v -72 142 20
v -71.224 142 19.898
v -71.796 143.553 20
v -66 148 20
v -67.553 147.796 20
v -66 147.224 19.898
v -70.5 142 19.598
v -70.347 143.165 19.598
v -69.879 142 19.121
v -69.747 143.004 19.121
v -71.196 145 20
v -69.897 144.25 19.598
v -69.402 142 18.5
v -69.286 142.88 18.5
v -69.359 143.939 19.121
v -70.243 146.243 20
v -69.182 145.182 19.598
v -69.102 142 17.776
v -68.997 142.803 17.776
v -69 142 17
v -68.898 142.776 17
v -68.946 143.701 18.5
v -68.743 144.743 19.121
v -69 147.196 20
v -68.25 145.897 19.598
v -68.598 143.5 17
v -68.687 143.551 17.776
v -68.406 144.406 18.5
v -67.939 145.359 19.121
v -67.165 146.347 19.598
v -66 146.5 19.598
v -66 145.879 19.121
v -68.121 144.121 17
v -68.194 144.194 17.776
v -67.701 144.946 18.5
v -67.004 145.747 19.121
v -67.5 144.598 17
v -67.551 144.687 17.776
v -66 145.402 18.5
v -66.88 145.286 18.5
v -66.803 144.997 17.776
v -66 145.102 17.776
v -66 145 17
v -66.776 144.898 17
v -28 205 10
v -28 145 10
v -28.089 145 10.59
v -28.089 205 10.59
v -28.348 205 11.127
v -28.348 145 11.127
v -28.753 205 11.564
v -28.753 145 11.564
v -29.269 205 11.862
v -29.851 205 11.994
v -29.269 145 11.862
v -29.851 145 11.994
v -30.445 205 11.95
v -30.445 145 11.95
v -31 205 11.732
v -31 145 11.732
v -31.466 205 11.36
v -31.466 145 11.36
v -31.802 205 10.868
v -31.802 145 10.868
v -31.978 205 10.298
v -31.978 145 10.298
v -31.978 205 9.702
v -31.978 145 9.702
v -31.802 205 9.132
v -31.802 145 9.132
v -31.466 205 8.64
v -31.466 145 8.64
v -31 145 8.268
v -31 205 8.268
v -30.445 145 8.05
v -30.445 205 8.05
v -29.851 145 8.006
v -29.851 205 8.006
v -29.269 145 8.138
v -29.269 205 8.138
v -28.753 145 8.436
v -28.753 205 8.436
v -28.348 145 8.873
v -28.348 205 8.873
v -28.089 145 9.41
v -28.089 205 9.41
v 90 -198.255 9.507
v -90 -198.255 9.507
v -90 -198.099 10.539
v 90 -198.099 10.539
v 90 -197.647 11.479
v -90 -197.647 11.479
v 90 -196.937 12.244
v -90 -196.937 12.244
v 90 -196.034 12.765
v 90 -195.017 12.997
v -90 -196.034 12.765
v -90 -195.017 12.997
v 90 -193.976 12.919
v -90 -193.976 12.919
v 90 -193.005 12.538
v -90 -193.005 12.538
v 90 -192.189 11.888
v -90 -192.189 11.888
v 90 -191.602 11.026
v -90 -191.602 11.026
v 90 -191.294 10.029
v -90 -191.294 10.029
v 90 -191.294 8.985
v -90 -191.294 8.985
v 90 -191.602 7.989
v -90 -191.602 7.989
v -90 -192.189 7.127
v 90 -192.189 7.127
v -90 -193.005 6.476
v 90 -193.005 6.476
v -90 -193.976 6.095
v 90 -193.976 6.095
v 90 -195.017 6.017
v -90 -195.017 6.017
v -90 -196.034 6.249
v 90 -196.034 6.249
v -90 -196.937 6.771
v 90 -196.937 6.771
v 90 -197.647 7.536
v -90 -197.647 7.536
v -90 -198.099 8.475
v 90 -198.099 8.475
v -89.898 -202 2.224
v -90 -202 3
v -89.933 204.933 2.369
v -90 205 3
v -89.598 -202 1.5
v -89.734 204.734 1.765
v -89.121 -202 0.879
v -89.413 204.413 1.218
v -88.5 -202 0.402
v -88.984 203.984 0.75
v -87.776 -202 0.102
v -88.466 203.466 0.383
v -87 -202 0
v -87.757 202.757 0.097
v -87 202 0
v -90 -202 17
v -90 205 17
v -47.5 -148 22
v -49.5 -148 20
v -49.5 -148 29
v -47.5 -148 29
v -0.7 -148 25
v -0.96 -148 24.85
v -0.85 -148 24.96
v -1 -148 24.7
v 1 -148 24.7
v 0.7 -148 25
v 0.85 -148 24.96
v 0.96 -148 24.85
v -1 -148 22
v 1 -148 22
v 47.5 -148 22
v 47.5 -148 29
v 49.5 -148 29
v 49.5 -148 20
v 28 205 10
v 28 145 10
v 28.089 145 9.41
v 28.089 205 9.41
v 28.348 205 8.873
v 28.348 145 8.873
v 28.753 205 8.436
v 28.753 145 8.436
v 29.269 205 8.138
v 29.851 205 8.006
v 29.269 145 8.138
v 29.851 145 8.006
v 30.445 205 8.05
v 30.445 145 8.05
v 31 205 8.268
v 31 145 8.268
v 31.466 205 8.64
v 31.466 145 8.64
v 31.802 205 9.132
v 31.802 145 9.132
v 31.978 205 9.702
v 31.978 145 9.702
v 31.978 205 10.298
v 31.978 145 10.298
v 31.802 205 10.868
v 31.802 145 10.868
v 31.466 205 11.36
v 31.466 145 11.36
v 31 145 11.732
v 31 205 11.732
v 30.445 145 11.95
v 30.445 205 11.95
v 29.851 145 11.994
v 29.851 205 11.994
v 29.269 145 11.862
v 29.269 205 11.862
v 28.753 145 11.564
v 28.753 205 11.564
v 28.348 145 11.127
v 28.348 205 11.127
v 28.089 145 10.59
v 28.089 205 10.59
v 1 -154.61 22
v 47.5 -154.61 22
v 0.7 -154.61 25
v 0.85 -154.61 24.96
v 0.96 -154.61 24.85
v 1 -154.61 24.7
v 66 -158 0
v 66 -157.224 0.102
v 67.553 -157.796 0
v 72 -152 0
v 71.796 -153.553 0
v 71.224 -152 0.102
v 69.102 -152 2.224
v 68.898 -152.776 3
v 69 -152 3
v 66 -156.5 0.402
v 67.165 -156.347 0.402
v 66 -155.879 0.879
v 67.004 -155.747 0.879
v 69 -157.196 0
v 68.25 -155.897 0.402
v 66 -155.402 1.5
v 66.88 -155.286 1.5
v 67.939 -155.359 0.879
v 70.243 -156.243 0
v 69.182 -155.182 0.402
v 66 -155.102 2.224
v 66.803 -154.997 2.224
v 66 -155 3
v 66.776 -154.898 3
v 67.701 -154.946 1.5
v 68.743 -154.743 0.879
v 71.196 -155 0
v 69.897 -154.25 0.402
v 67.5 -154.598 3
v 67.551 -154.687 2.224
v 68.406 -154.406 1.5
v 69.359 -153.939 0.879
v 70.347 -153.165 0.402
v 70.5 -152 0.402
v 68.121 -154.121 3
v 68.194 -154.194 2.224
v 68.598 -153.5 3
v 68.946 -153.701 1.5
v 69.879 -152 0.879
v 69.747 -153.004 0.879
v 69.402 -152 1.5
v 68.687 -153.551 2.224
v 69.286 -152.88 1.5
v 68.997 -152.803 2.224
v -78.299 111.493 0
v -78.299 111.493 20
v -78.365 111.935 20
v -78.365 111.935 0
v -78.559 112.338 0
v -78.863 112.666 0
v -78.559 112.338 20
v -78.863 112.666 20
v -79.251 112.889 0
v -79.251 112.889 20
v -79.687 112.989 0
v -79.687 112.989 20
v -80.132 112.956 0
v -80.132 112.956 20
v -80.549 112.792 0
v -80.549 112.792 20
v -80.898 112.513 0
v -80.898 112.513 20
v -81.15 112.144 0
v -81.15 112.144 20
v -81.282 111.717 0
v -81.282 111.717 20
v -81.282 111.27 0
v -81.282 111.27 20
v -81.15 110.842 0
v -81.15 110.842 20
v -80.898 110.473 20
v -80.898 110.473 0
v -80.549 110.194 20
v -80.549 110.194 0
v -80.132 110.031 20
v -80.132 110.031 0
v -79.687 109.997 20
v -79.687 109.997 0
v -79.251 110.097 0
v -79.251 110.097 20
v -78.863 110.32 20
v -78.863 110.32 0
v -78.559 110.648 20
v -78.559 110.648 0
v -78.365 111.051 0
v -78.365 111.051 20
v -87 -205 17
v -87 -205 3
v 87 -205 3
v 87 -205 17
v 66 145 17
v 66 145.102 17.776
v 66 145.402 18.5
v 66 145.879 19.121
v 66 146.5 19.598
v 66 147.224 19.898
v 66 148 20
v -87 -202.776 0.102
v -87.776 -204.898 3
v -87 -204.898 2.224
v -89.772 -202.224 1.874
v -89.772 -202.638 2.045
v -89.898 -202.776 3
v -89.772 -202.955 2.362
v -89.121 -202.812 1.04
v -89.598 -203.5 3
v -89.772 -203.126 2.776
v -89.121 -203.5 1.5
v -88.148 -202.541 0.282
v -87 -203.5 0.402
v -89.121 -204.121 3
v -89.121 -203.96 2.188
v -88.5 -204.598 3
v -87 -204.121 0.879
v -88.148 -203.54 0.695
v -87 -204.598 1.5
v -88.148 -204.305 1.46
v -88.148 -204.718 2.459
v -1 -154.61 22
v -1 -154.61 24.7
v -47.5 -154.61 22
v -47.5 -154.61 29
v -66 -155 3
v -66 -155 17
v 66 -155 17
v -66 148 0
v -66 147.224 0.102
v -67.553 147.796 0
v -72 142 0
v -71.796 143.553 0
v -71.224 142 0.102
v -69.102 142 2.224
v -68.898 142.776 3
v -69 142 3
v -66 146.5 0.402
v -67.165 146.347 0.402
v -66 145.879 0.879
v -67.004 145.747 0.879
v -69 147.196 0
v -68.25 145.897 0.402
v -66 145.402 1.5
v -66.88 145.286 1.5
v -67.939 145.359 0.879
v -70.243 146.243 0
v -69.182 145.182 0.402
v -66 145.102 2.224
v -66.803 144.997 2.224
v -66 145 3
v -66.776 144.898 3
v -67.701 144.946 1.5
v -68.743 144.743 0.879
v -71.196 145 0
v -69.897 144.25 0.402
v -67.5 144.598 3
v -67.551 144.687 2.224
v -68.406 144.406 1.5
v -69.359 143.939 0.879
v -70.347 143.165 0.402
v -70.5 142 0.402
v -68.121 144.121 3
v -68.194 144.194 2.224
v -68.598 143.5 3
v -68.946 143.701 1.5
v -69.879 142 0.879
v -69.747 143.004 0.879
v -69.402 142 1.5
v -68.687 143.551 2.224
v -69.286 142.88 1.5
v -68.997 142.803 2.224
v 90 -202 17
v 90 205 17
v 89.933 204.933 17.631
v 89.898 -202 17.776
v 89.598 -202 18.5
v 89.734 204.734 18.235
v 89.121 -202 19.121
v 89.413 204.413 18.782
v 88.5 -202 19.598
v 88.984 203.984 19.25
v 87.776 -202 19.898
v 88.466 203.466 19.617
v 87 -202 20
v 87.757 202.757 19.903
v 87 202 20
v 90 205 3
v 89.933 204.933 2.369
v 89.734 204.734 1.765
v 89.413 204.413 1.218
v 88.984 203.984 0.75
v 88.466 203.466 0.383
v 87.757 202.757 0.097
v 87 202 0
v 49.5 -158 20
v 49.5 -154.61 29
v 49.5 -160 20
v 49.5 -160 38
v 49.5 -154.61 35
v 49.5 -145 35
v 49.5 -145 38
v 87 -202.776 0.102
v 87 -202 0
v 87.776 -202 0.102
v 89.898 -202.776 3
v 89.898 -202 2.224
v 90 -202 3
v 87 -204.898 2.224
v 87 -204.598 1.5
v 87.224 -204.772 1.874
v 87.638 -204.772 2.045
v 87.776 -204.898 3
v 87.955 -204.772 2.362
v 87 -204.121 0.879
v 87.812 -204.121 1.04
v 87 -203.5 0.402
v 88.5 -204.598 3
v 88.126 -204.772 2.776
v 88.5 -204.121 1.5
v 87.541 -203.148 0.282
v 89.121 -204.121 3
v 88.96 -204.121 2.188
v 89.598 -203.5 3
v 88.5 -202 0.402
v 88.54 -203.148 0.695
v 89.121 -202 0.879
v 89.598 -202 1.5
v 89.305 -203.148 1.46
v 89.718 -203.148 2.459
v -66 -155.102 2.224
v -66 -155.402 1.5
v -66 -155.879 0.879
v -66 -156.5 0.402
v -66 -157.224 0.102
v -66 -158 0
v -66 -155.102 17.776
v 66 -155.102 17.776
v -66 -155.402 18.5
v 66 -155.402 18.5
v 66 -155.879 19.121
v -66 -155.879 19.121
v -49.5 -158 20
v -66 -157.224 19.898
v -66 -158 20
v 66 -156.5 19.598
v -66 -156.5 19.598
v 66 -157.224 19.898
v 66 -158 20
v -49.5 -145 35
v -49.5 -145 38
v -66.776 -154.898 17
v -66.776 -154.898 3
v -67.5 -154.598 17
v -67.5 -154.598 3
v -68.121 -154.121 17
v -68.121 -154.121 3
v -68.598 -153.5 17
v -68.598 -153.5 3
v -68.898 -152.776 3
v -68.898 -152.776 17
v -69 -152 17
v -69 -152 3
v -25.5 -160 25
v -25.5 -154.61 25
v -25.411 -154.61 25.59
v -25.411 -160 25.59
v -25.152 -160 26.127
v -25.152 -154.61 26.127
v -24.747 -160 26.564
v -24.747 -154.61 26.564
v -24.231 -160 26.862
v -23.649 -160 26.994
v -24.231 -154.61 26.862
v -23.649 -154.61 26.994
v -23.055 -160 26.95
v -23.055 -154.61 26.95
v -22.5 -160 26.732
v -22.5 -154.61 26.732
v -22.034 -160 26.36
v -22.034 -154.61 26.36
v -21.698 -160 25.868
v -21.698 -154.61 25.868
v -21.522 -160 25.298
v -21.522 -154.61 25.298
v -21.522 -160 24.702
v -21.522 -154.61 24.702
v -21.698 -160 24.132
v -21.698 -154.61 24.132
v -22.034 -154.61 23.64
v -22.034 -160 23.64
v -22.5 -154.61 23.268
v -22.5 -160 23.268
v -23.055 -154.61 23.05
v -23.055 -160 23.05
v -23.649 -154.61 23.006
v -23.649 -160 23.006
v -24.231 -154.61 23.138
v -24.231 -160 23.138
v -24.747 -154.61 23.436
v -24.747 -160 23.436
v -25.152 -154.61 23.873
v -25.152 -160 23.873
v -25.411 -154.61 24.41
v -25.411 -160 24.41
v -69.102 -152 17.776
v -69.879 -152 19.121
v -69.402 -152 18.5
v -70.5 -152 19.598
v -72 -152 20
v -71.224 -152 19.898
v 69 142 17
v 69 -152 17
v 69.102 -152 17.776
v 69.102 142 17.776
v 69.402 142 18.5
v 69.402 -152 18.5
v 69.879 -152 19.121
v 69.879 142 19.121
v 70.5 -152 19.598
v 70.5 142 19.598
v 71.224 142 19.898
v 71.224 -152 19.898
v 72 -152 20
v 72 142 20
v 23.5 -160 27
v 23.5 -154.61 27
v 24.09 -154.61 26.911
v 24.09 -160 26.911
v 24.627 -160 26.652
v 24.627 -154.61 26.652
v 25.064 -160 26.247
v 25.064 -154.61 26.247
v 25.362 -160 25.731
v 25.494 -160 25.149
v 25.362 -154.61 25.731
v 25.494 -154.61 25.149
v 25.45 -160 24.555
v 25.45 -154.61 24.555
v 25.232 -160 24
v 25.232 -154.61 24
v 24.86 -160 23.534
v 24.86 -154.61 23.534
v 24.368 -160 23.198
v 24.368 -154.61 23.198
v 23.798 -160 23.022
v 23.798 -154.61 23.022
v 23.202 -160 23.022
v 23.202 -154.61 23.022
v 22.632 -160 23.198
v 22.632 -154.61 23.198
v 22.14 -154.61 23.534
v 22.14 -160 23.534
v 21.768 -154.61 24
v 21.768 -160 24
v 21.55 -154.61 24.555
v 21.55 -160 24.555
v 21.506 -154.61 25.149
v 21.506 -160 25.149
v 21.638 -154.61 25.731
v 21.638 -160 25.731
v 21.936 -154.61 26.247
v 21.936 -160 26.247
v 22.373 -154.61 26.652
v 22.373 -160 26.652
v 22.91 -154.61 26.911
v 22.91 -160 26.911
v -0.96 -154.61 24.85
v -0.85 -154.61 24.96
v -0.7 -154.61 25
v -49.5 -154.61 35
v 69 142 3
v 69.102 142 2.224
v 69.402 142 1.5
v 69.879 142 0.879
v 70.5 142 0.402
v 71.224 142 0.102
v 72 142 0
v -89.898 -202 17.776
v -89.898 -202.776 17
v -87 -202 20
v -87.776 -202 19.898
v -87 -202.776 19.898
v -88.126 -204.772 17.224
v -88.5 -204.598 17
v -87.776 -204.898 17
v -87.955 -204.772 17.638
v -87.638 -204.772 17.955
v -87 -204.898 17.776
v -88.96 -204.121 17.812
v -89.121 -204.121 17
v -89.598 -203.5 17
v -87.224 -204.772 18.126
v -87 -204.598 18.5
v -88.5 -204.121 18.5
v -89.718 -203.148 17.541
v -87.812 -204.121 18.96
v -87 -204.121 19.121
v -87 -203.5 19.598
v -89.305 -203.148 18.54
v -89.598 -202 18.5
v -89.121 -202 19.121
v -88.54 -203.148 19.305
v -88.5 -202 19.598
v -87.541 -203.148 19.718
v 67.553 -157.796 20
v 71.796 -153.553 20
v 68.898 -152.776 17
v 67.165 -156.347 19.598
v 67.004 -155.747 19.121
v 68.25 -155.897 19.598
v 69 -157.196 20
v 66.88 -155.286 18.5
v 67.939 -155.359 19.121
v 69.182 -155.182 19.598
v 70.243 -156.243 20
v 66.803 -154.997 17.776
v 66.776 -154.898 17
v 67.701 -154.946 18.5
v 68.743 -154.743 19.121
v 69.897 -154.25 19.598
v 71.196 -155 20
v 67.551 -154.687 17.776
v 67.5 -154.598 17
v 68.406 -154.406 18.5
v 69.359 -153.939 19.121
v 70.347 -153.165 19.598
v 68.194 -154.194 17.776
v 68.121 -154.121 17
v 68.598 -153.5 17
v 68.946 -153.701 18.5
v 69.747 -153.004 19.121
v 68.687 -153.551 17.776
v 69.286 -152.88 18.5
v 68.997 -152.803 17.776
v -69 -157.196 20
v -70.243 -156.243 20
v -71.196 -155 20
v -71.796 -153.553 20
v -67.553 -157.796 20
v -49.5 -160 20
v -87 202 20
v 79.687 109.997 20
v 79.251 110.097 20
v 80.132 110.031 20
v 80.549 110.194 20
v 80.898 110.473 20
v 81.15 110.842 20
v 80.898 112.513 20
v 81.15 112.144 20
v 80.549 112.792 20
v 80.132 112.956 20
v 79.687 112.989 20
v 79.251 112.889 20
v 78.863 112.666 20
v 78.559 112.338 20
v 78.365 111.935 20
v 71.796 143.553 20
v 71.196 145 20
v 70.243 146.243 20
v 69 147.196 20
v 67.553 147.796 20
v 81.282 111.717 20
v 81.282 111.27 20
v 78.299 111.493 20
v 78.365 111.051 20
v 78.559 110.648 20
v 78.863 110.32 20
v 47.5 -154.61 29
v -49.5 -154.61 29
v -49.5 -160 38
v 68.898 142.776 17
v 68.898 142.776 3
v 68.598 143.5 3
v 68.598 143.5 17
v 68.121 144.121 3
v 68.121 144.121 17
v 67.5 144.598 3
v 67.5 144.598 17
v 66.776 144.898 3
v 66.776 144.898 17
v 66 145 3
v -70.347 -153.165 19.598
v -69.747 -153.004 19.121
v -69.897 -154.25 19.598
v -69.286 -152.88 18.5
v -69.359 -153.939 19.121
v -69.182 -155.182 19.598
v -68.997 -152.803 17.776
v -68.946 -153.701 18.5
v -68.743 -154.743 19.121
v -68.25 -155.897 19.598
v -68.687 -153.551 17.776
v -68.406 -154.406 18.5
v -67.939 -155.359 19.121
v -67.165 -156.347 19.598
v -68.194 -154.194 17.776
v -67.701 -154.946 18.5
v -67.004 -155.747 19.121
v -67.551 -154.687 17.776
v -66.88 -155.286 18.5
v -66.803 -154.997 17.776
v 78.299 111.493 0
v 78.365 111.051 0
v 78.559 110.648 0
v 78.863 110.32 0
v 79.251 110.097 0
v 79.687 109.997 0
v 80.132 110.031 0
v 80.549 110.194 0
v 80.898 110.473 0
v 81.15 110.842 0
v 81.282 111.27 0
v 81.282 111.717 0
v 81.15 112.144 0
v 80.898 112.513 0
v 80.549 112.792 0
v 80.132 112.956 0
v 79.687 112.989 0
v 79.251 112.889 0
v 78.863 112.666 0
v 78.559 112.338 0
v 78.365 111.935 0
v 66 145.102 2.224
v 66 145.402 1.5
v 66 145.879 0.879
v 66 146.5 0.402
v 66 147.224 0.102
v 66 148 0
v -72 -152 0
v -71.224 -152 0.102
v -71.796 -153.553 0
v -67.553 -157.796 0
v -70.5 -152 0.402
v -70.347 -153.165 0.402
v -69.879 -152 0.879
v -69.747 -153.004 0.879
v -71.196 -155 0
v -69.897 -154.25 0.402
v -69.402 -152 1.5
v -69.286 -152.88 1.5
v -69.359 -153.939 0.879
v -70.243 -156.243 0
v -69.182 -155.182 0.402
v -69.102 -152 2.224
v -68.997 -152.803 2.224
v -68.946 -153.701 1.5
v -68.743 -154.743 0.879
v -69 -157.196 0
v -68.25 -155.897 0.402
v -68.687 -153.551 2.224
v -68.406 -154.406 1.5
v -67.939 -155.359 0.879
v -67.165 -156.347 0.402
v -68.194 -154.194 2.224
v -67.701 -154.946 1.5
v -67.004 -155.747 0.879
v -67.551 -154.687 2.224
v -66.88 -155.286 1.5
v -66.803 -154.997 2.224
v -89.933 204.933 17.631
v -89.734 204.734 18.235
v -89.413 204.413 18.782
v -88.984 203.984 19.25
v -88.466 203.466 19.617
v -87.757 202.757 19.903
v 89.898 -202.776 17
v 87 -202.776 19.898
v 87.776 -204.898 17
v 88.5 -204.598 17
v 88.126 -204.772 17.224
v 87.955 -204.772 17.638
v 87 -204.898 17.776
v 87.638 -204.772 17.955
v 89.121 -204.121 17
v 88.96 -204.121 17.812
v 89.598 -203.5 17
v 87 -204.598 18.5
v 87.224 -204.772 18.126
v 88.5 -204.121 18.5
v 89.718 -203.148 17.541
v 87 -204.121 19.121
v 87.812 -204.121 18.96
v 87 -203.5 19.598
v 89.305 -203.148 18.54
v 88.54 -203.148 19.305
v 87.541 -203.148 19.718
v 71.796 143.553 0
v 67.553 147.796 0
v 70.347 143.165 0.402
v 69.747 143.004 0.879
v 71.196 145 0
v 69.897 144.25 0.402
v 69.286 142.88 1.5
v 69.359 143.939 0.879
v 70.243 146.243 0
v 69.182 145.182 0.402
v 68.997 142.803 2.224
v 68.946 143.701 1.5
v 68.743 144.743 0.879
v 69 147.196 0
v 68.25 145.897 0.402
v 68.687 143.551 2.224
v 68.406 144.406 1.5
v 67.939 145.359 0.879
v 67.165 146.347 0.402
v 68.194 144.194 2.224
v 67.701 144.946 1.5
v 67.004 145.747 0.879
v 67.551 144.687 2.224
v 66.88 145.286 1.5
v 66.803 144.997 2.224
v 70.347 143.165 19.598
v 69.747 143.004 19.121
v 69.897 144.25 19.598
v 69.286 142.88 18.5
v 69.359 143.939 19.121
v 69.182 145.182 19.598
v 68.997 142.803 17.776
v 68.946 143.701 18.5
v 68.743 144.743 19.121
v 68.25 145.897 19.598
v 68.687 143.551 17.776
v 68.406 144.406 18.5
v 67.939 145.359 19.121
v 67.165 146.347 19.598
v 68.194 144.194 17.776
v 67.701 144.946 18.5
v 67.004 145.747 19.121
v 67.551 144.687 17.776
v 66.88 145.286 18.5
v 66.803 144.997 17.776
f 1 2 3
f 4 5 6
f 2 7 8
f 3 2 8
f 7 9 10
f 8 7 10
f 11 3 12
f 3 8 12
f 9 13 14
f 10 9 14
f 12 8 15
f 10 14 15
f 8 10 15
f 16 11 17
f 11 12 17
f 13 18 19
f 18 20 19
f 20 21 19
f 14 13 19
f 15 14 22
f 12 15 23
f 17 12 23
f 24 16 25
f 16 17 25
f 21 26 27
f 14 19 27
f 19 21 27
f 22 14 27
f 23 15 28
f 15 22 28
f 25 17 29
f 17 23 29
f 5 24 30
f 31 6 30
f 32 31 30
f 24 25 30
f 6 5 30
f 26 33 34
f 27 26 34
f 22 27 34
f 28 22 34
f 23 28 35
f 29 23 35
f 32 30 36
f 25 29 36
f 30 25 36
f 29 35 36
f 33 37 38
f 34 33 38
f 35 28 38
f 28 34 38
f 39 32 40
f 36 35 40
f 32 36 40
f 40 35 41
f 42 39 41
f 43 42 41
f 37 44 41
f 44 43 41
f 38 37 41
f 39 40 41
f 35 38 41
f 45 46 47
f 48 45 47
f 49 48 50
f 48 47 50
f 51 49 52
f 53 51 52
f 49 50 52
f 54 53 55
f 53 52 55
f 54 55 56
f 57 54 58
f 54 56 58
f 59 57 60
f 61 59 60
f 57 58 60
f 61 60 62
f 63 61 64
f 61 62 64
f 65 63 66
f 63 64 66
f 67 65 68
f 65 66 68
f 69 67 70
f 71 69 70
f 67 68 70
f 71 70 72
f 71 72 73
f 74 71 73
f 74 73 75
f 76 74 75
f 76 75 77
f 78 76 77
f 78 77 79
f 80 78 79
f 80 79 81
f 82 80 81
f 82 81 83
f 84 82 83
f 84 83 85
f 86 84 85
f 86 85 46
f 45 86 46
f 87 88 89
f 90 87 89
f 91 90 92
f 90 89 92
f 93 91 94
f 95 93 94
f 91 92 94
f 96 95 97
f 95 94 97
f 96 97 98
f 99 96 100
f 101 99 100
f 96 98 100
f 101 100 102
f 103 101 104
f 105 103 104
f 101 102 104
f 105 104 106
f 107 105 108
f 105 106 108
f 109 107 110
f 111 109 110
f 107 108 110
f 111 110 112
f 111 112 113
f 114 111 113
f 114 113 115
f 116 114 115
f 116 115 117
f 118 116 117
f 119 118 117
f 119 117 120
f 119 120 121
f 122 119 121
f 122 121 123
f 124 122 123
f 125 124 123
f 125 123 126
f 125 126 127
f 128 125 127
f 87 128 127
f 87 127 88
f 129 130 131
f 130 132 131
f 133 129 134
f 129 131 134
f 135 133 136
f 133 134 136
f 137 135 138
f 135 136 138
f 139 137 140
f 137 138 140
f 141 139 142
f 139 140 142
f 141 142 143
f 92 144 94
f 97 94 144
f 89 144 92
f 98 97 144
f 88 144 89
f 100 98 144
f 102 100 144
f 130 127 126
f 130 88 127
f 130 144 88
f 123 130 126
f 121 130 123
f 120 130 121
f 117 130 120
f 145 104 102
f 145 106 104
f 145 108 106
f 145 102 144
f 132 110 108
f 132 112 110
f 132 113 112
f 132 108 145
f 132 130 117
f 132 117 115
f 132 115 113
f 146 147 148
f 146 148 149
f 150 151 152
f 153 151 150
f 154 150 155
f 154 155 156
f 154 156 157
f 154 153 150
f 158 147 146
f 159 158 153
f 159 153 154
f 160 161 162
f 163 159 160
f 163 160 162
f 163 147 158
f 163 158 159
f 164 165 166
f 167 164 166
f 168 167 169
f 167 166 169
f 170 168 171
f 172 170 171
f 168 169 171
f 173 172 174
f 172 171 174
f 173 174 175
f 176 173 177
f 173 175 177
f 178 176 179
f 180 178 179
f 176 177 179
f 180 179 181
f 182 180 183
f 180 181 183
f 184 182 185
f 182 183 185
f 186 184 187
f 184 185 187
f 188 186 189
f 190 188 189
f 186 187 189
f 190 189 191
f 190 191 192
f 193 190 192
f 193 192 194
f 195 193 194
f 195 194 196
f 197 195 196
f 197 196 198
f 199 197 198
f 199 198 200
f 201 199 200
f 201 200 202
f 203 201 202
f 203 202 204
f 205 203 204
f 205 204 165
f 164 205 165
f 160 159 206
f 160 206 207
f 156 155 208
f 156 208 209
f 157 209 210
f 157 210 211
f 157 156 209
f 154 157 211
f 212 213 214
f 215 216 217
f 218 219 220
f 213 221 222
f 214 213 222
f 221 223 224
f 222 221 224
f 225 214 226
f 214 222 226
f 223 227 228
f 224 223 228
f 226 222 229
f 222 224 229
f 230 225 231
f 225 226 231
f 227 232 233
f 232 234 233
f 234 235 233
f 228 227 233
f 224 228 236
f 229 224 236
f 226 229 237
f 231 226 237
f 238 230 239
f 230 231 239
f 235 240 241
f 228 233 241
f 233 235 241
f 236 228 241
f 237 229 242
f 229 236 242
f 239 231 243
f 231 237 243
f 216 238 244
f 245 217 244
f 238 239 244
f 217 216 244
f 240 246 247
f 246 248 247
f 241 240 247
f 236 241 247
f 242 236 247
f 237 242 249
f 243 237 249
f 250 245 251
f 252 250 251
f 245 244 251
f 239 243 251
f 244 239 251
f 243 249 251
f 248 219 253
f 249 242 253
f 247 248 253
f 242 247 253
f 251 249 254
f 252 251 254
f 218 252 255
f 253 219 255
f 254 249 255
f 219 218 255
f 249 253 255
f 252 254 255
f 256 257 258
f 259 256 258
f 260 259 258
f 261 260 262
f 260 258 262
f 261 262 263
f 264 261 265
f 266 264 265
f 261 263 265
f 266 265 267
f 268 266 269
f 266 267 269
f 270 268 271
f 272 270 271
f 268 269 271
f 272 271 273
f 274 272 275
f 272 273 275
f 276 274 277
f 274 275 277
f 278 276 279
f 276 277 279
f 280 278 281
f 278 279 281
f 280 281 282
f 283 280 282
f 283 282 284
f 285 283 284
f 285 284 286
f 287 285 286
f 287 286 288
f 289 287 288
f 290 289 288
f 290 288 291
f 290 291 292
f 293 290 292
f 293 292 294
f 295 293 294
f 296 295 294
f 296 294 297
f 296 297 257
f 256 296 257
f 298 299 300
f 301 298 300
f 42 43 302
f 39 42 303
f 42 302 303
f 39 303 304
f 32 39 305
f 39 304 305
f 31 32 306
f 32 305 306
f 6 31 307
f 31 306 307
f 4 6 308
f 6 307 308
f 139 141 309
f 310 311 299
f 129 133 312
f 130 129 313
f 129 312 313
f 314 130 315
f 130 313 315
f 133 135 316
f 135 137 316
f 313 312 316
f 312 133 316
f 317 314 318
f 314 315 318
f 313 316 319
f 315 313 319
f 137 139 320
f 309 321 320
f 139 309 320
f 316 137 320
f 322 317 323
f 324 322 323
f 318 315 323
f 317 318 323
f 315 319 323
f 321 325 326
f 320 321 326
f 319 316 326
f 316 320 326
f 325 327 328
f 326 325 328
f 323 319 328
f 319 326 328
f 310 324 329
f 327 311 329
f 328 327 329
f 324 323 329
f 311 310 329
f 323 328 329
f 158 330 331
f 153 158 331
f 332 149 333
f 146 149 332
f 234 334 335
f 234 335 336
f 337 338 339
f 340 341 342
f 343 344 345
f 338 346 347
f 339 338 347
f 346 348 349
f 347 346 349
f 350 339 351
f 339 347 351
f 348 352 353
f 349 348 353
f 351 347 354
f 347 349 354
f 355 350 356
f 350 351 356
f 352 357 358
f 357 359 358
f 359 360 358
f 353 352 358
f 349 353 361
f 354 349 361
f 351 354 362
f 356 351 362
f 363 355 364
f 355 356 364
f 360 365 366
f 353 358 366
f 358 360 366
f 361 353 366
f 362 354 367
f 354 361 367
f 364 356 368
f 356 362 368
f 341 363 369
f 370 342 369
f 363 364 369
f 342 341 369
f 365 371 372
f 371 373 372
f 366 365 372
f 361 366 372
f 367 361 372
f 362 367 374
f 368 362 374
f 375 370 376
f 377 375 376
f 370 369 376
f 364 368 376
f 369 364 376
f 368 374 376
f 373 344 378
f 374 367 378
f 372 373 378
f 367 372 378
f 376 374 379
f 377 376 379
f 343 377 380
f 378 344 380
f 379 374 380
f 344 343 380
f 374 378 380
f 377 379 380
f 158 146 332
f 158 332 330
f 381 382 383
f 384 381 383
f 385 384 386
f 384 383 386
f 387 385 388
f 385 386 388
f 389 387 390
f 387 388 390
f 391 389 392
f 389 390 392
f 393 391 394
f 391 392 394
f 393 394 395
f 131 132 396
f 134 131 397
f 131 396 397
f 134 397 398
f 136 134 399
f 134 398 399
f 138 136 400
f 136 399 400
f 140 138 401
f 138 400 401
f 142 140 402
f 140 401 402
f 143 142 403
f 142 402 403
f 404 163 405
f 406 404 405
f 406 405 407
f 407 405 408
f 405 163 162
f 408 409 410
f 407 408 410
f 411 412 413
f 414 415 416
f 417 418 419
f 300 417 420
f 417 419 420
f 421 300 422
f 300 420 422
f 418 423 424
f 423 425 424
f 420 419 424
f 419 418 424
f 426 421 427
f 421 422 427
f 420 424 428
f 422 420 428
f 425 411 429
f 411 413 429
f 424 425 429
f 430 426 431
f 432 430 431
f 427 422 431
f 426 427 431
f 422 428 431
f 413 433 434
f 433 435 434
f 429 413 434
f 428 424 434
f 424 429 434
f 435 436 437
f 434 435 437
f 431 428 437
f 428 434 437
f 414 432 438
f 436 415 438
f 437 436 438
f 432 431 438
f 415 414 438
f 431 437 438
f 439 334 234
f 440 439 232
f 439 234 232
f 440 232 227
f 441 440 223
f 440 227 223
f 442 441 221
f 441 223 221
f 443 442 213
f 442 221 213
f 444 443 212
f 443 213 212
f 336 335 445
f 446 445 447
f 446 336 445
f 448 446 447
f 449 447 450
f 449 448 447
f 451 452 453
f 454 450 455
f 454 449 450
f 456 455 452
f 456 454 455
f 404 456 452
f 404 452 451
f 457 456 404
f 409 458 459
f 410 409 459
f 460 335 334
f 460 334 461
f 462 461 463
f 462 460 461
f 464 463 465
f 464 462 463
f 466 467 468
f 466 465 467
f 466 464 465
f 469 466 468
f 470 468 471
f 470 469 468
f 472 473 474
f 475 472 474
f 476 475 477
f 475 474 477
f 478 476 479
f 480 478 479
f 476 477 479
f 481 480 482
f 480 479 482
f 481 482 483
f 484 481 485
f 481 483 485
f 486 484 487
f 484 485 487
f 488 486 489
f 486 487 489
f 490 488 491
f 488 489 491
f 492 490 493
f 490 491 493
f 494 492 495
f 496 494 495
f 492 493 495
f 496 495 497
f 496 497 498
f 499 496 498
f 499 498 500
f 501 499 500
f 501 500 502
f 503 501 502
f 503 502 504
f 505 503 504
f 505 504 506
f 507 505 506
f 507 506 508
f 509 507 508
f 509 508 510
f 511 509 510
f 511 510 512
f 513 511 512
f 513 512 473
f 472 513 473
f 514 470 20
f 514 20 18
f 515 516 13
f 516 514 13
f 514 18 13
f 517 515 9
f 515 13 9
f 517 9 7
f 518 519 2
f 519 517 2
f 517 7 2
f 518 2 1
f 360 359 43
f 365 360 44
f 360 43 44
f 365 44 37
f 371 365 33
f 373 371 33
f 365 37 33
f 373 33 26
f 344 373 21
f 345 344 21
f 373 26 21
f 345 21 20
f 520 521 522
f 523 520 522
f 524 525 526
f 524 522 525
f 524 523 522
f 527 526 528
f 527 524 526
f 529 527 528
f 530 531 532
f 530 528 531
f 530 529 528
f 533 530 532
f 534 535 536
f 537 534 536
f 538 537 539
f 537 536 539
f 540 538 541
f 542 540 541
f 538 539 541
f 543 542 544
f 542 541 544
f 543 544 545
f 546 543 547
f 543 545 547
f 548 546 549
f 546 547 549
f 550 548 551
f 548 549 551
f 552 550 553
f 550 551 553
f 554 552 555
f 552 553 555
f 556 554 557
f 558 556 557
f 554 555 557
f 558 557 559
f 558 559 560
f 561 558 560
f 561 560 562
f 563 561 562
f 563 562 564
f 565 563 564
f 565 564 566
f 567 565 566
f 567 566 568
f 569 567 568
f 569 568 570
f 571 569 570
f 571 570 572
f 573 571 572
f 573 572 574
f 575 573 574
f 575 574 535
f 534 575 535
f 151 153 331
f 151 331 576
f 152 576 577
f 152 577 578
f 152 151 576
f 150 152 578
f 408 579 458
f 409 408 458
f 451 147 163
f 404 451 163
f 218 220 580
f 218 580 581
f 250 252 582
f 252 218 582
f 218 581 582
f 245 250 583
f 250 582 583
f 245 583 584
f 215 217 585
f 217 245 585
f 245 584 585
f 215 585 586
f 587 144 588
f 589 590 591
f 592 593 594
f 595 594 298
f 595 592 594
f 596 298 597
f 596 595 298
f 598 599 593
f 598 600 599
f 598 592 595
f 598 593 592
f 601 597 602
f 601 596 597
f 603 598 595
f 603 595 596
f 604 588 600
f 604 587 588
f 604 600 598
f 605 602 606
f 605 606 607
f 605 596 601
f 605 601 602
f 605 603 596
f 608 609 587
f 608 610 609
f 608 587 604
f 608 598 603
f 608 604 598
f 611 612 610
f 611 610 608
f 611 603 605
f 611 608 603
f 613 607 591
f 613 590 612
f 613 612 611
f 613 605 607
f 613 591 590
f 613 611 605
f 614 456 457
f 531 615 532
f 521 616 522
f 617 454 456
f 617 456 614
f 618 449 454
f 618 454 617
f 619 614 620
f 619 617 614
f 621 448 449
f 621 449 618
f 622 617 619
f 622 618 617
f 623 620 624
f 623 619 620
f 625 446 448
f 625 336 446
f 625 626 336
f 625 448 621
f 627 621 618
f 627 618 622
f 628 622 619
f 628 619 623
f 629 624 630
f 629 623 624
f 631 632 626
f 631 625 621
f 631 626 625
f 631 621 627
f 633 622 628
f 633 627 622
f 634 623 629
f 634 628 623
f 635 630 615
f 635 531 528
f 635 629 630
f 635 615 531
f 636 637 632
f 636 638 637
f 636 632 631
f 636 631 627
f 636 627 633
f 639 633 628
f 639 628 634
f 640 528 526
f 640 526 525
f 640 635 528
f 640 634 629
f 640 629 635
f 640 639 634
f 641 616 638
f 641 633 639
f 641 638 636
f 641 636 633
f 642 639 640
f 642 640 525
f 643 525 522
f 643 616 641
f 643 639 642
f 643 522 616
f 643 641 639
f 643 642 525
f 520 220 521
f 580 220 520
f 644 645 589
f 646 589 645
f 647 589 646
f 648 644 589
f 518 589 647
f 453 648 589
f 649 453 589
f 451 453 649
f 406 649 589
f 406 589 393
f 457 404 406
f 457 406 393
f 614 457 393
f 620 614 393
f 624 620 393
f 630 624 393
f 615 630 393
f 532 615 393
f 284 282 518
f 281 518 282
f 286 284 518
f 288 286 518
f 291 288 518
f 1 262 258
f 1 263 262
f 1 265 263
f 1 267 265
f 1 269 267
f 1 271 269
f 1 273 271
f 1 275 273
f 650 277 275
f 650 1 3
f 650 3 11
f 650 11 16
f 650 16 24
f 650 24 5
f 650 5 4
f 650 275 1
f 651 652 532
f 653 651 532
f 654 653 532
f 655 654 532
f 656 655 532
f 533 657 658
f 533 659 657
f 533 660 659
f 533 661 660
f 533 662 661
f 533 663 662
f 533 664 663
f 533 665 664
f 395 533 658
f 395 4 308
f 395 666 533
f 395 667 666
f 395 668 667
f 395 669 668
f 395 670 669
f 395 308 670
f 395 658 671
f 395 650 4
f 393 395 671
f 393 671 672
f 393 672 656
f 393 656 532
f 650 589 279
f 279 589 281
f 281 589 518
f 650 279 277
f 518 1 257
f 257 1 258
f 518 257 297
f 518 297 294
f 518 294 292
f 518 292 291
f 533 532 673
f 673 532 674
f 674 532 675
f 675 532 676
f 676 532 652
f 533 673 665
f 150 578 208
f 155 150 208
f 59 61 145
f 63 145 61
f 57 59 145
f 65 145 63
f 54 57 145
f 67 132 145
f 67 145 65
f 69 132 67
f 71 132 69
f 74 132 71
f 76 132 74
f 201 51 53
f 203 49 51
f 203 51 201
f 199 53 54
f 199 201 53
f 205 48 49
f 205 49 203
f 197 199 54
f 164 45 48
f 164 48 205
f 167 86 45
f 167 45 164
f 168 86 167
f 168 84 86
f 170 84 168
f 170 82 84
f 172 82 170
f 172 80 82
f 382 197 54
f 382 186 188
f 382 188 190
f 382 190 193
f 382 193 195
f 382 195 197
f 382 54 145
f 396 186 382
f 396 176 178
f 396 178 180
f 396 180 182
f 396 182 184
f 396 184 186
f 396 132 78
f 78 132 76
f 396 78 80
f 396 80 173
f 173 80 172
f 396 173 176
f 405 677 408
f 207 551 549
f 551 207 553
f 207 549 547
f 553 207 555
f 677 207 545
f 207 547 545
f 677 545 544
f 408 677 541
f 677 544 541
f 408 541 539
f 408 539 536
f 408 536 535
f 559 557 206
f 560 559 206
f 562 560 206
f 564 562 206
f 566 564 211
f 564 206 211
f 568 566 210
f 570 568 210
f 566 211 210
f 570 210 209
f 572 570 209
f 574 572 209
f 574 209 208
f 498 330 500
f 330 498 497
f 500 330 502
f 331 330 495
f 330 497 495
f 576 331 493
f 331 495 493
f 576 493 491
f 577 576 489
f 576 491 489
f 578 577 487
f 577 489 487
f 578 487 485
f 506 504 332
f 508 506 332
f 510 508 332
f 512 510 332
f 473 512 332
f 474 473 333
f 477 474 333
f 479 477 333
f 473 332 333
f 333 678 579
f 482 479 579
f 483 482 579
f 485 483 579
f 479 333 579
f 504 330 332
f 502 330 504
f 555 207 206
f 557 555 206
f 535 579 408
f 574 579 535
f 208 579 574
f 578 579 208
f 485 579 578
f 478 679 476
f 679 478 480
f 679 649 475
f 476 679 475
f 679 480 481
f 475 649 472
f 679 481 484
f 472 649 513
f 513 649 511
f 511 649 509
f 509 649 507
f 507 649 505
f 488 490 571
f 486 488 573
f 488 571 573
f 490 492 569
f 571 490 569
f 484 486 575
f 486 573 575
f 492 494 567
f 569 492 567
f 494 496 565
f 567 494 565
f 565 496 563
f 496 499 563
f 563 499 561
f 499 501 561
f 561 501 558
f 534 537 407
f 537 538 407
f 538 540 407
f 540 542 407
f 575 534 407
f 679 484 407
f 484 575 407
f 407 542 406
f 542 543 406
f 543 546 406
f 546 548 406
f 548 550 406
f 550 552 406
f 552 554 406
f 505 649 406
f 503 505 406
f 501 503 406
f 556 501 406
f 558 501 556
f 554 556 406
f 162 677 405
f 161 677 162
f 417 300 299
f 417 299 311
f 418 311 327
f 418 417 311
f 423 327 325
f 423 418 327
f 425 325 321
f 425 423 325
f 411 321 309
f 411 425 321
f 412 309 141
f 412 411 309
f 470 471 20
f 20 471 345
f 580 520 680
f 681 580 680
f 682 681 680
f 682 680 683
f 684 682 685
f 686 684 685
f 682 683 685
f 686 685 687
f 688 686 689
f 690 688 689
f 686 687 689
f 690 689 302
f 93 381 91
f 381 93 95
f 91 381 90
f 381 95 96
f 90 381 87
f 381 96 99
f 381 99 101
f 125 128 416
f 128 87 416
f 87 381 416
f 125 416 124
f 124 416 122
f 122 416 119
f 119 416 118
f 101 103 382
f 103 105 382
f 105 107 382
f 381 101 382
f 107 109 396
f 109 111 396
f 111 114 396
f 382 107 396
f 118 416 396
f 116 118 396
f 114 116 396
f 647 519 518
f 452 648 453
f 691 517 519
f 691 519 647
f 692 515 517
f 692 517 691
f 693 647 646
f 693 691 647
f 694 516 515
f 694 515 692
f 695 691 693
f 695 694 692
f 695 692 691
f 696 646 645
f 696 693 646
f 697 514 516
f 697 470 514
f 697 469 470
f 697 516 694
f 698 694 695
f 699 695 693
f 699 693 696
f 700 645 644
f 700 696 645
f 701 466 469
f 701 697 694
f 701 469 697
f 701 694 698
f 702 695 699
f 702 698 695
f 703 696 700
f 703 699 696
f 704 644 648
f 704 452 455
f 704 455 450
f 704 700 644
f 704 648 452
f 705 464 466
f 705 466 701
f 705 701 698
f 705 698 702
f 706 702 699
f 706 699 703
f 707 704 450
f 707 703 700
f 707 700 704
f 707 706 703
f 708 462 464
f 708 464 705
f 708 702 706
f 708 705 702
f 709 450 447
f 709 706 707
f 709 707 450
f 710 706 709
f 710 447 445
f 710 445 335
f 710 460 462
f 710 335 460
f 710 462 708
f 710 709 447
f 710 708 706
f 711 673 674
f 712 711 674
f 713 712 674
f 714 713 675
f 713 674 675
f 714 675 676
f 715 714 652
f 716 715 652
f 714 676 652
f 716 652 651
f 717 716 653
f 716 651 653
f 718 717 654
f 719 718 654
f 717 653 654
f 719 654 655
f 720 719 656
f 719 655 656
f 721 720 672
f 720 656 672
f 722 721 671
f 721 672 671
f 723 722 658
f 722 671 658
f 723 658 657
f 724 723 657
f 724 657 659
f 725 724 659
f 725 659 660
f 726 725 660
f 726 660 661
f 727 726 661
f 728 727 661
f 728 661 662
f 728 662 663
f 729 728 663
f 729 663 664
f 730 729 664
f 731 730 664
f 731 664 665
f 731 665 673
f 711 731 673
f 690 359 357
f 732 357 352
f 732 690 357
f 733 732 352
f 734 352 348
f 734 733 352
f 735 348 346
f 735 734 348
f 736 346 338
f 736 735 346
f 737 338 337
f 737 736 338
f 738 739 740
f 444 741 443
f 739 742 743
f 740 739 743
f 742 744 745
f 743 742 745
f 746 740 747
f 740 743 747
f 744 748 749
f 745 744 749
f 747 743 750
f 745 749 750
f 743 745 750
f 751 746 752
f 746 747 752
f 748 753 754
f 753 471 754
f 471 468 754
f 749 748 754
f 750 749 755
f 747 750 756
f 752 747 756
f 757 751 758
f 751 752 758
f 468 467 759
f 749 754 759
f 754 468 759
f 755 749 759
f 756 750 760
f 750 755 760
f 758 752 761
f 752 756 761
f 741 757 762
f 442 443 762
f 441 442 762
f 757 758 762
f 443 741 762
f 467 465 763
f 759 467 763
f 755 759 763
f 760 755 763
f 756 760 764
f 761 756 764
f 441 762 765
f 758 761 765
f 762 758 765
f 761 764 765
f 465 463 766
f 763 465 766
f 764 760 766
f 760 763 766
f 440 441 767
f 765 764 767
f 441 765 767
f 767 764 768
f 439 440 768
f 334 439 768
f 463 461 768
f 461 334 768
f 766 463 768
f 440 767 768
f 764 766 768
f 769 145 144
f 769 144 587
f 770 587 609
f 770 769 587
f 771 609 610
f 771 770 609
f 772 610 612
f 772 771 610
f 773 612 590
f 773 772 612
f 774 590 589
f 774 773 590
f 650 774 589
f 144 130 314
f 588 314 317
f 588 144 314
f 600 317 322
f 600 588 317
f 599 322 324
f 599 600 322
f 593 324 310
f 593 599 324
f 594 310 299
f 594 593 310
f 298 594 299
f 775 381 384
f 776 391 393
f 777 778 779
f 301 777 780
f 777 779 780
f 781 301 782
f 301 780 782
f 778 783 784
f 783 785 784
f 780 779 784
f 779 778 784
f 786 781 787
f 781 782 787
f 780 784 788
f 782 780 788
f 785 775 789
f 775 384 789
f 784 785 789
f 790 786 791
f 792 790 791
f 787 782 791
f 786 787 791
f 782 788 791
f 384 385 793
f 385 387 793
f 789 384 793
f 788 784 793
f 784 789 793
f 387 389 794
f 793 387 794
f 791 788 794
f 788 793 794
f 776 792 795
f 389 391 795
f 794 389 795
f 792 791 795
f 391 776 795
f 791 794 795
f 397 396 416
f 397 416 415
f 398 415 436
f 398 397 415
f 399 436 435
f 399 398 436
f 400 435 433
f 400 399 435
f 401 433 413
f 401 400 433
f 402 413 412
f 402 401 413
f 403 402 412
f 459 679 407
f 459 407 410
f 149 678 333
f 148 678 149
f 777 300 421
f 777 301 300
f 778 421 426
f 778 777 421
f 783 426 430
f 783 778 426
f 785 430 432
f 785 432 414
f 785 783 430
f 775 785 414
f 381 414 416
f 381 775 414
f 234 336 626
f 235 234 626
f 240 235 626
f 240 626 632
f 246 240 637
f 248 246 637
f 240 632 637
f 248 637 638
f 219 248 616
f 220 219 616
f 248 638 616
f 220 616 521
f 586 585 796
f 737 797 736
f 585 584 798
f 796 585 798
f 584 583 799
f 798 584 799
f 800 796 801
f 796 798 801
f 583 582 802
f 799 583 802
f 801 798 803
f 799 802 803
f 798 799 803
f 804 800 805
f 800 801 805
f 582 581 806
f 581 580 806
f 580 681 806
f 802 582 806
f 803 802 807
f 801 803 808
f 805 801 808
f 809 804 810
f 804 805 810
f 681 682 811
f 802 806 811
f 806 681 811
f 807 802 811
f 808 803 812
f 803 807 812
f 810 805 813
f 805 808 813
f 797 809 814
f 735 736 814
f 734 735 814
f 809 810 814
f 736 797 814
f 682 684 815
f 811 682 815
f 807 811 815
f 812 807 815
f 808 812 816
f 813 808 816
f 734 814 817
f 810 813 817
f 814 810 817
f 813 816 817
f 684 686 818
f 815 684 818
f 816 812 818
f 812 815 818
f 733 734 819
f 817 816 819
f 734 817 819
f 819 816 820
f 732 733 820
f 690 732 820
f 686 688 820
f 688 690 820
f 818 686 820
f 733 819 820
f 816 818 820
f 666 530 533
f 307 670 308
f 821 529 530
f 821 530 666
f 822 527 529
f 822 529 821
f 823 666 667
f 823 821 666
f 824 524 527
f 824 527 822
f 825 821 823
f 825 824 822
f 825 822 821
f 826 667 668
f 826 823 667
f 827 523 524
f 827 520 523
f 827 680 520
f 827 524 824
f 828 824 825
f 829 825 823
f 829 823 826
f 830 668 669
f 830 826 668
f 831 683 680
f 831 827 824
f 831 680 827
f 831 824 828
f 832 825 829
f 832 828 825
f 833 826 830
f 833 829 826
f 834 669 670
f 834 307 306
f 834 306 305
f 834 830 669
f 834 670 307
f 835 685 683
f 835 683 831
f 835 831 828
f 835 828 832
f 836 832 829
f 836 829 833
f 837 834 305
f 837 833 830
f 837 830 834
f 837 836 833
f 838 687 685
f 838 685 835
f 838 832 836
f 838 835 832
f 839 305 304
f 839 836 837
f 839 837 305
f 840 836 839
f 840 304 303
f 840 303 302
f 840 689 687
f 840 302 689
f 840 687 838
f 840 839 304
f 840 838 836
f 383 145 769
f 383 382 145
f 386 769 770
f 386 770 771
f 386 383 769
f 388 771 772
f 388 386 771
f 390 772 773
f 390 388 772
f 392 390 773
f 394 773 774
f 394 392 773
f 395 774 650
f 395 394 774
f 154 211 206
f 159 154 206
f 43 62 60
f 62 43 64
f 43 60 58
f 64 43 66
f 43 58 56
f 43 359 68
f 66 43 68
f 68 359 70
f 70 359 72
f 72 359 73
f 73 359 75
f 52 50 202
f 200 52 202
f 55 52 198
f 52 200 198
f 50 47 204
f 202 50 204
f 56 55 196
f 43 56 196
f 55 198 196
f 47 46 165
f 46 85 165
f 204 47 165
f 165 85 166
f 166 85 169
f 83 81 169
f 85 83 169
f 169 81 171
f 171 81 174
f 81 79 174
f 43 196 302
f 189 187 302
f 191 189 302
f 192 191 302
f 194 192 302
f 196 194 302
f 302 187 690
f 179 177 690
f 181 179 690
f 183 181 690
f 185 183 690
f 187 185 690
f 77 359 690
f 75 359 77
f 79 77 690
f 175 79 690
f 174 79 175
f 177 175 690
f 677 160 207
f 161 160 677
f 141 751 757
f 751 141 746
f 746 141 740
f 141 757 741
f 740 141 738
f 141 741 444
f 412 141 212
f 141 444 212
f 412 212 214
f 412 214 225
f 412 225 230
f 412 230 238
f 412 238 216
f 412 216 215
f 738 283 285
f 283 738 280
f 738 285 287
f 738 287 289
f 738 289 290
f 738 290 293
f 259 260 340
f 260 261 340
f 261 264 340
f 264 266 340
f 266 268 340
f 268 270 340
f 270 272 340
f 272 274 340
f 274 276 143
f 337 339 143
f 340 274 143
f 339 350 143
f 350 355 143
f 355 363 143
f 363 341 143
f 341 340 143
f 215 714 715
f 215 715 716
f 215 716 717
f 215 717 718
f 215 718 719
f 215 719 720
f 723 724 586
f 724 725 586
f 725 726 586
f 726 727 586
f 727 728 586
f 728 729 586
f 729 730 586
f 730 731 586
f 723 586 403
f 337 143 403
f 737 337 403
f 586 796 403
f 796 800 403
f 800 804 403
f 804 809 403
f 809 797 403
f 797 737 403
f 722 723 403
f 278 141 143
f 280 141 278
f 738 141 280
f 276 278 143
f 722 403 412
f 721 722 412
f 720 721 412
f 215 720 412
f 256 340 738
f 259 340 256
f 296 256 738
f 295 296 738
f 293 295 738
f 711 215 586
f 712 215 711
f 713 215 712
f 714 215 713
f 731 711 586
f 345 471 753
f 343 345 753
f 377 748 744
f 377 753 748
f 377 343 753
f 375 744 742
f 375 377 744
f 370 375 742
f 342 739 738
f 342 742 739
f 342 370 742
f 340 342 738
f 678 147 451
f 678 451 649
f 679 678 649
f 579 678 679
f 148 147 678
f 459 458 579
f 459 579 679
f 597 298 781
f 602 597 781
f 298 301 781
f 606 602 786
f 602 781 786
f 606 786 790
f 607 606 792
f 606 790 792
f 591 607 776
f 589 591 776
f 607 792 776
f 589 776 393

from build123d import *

# Parameters (mm, degrees)
ESQUISSE1_W             = 180
ESQUISSE1_H             = 410
ESQUISSE1_W_2           = 138
ESQUISSE1_H_2           = 300
BOSS_EXTRU_1_DEPTH      = 20
CONG_1_R                = 3
ESQUISSE2_R             = 2
ENL_V_MAT_EXTRU_1_DEPTH = 362.939221417
ESQUISSE3_R             = 1.5
ENL_V_MAT_EXTRU_2_DEPTH = 225.77766793
ESQUISSE4_R             = 3.5
ENL_V_MAT_EXTRU_3_DEPTH = 274.541587332
ESQUISSE5_W             = 99
ESQUISSE5_H             = 12
BOSS_EXTRU_2_DEPTH      = 18
ESQUISSE12_W            = 3
ESQUISSE12_H            = 3
BOSS_EXTRU_5_DEPTH      = 99
ESQUISSE13_W            = 6
ESQUISSE13_H            = 6.6095607
ENL_V_MAT_EXTRU_5_DEPTH = 99
ENL_V_MAT_EXTRU_6_DEPTH = 6.6095607
ESQUISSE15_R            = 2
ENL_V_MAT_EXTRU_7_DEPTH = 373.643309543


with BuildPart() as part:
    # Esquisse1 → Boss.-Extru.1 (new body)
    with BuildSketch(Plane.XY):
        Rectangle(ESQUISSE1_W, ESQUISSE1_H)
        with Locations((0, -5)):
            Rectangle(ESQUISSE1_W_2, ESQUISSE1_H_2, mode=Mode.SUBTRACT)
    extrude(amount=BOSS_EXTRU_1_DEPTH)

    # Congé1
    cong_1_edges = [part.edges().sort_by_distance(p)[0] for p in [
        (90, 0, 20),
        (-69, -5, 0),
        (-69, 145, 10),
        (0, -155, 0),
        (-69, -155, 10),
        (69, -5, 0),
        (69, -155, 10),
        (0, 145, 0),
        (69, 145, 10),
        (-69, -5, 20),
        (0, 205, 20),
        (0, -155, 20),
        (69, -5, 20),
        (0, 145, 20),
        (-90, 0, 20),
        (0, 205, 0),
        (90, 0, 0),
        (0, -205, 0),
        (-90, 0, 0),
        (90, -205, 10),
        (-90, -205, 10),
        (0, -205, 20),
    ]]
    fillet(cong_1_edges, radius=CONG_1_R)

    # Esquisse2 → Enlèv. mat.-Extru.1 (cut, through all)
    with BuildSketch(Plane.XZ.offset(-145)):
        with Locations((-30, 10)):
            Circle(ESQUISSE2_R)
        with Locations(Location((30, 10, 0), (0, 0, 180))):
            Circle(ESQUISSE2_R)
    extrude(amount=-ENL_V_MAT_EXTRU_1_DEPTH, mode=Mode.SUBTRACT)

    # Esquisse3 → Enlèv. mat.-Extru.2 (cut, through all)
    with BuildSketch(Plane.XY.offset(20)):
        with Locations((-79.79859846, 111.493173655)):
            Circle(ESQUISSE3_R)
        with Locations(Location((79.79859846, 111.493173655, 0), (0, 0, 180))):
            Circle(ESQUISSE3_R)
    extrude(amount=-ENL_V_MAT_EXTRU_2_DEPTH, mode=Mode.SUBTRACT)

    # Esquisse4 → Enlèv. mat.-Extru.3 (cut, through all)
    with BuildSketch(Plane.ZY.offset(90)):
        with Locations(Location((9.507126216, -194.754948591, 0), (0, 0, 270))):
            Circle(ESQUISSE4_R)
    extrude(amount=-ENL_V_MAT_EXTRU_3_DEPTH, mode=Mode.SUBTRACT)

    # Esquisse5 → Boss.-Extru.2 (add)
    with BuildSketch(Plane.XY.offset(20)):
        with Locations((0, -154)):
            Rectangle(ESQUISSE5_W, ESQUISSE5_H)
    extrude(amount=BOSS_EXTRU_2_DEPTH)

    # Esquisse12 → Boss.-Extru.5 (add)
    with BuildSketch(Plane.ZY.offset(49.5)):
        with Locations((36.5, -146.5)):
            Rectangle(ESQUISSE12_W, ESQUISSE12_H)
    extrude(amount=-BOSS_EXTRU_5_DEPTH)

    # Esquisse13 → Enlèv. mat.-Extru.5 (cut)
    with BuildSketch(Plane.ZY.offset(49.5)):
        with Locations((32, -151.30478035)):
            Rectangle(ESQUISSE13_W, ESQUISSE13_H)
    extrude(amount=-ENL_V_MAT_EXTRU_5_DEPTH, mode=Mode.SUBTRACT)

    # Esquisse14 → Enlèv. mat.-Extru.6 (cut)
    with BuildSketch(Plane(origin=(0, -148, 0), x_dir=(1, 0, 0), z_dir=(0, 1, 0))):
        with BuildLine():
            Line((-47.5, -29), (-47.5, -22))
            Line((-47.5, -22), (-1, -22))
            Line((-1, -22), (-1, -24.7))
            ThreePointArc((-1, -24.7), (-0.912132034, -24.912132034), (-0.7, -25))
            Line((-0.7, -25), (0.7, -25))
            ThreePointArc((0.7, -25), (0.912132034, -24.912132034), (1, -24.7))
            Line((1, -24.7), (1, -22))
            Line((1, -22), (47.5, -22))
            Line((47.5, -22), (47.5, -29))
            Line((47.5, -29), (-47.5, -29))
        make_face()
    extrude(amount=-ENL_V_MAT_EXTRU_6_DEPTH, mode=Mode.SUBTRACT)

    # Esquisse15 → Enlèv. mat.-Extru.7 (cut, through all)
    with BuildSketch(Plane(origin=(0, -154.6095607, 0), x_dir=(1, 0, 0), z_dir=(0, 1, 0))):
        with Locations(Location((-23.5, -25, 0), (0, 0, 180))):
            Circle(ESQUISSE15_R)
        with Locations(Location((23.5, -25, 0), (0, 0, 270))):
            Circle(ESQUISSE15_R)
    extrude(amount=-ENL_V_MAT_EXTRU_7_DEPTH, mode=Mode.SUBTRACT)


solid = part.part
